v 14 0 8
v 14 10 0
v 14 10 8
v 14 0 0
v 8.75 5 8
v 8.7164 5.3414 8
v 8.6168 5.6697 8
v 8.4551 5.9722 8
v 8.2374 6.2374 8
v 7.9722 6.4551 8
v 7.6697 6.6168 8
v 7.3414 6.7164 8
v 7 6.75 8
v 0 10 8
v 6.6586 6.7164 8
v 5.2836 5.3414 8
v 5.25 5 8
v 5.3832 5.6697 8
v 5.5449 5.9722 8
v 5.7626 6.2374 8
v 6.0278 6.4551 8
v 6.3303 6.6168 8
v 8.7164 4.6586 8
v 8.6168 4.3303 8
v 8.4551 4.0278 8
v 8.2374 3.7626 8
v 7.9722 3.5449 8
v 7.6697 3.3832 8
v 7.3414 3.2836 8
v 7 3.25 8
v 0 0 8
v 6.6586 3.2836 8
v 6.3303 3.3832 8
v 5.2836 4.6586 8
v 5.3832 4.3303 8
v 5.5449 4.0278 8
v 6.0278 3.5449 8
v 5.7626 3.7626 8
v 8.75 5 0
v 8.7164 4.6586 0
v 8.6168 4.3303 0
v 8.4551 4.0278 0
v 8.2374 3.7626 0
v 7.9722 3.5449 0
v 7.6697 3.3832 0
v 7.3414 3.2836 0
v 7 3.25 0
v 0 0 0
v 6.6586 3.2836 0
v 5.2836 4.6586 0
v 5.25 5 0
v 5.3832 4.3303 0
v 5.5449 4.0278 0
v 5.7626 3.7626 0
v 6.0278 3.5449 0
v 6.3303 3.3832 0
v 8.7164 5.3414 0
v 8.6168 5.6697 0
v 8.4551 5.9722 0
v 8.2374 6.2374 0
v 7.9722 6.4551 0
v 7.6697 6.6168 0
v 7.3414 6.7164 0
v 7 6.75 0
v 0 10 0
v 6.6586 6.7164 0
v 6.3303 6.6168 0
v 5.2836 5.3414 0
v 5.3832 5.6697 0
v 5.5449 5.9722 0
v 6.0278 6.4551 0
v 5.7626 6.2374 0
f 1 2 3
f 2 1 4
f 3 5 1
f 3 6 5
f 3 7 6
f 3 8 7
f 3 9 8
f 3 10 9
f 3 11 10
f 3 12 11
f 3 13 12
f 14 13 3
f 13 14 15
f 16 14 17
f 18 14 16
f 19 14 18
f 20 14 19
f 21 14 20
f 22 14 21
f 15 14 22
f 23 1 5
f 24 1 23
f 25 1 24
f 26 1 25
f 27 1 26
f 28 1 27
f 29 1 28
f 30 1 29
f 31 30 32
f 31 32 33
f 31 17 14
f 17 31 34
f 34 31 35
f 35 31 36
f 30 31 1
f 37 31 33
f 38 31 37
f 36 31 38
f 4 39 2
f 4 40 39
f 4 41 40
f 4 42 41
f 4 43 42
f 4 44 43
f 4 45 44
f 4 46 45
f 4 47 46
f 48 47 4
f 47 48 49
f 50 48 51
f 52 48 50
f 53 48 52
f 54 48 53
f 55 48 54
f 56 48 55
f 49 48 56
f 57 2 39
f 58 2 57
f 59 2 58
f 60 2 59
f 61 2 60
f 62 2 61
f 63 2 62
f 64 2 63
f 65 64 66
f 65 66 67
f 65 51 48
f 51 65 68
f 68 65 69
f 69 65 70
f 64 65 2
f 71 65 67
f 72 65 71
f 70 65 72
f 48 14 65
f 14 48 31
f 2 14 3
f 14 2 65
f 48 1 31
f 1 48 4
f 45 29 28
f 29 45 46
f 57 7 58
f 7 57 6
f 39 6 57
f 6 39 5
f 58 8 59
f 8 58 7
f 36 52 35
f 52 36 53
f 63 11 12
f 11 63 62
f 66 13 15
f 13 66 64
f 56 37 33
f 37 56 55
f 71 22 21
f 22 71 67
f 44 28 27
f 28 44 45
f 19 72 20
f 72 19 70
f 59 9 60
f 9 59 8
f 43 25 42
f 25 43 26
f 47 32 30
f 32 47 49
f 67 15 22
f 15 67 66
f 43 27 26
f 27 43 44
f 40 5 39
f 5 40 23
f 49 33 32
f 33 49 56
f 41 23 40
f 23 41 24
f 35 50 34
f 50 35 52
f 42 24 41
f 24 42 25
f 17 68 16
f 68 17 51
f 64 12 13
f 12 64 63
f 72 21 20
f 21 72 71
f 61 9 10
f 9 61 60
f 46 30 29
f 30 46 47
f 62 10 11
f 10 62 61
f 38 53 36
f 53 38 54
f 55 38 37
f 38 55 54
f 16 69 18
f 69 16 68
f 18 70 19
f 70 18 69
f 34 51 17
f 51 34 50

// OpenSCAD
$fn = 32;
// target_bbox: 14, 10, 8
// ----------------------------------------------------------------------
// Micro pad: drilled pad, 5-20 mm class
// ----------------------------------------------------------------------

// --- parameters (mm) ---
pad_l = 14;               // pad length, X
pad_w = 10;               // pad width, Y
pad_t = 8;                // pad thickness, Z
hole_d = 3.5;             // through hole diameter

difference() {
  cube([pad_l, pad_w, pad_t]);
  translate([pad_l / 2, pad_w / 2, -1])
    cylinder(h = pad_t + 2, d = hole_d);
}
